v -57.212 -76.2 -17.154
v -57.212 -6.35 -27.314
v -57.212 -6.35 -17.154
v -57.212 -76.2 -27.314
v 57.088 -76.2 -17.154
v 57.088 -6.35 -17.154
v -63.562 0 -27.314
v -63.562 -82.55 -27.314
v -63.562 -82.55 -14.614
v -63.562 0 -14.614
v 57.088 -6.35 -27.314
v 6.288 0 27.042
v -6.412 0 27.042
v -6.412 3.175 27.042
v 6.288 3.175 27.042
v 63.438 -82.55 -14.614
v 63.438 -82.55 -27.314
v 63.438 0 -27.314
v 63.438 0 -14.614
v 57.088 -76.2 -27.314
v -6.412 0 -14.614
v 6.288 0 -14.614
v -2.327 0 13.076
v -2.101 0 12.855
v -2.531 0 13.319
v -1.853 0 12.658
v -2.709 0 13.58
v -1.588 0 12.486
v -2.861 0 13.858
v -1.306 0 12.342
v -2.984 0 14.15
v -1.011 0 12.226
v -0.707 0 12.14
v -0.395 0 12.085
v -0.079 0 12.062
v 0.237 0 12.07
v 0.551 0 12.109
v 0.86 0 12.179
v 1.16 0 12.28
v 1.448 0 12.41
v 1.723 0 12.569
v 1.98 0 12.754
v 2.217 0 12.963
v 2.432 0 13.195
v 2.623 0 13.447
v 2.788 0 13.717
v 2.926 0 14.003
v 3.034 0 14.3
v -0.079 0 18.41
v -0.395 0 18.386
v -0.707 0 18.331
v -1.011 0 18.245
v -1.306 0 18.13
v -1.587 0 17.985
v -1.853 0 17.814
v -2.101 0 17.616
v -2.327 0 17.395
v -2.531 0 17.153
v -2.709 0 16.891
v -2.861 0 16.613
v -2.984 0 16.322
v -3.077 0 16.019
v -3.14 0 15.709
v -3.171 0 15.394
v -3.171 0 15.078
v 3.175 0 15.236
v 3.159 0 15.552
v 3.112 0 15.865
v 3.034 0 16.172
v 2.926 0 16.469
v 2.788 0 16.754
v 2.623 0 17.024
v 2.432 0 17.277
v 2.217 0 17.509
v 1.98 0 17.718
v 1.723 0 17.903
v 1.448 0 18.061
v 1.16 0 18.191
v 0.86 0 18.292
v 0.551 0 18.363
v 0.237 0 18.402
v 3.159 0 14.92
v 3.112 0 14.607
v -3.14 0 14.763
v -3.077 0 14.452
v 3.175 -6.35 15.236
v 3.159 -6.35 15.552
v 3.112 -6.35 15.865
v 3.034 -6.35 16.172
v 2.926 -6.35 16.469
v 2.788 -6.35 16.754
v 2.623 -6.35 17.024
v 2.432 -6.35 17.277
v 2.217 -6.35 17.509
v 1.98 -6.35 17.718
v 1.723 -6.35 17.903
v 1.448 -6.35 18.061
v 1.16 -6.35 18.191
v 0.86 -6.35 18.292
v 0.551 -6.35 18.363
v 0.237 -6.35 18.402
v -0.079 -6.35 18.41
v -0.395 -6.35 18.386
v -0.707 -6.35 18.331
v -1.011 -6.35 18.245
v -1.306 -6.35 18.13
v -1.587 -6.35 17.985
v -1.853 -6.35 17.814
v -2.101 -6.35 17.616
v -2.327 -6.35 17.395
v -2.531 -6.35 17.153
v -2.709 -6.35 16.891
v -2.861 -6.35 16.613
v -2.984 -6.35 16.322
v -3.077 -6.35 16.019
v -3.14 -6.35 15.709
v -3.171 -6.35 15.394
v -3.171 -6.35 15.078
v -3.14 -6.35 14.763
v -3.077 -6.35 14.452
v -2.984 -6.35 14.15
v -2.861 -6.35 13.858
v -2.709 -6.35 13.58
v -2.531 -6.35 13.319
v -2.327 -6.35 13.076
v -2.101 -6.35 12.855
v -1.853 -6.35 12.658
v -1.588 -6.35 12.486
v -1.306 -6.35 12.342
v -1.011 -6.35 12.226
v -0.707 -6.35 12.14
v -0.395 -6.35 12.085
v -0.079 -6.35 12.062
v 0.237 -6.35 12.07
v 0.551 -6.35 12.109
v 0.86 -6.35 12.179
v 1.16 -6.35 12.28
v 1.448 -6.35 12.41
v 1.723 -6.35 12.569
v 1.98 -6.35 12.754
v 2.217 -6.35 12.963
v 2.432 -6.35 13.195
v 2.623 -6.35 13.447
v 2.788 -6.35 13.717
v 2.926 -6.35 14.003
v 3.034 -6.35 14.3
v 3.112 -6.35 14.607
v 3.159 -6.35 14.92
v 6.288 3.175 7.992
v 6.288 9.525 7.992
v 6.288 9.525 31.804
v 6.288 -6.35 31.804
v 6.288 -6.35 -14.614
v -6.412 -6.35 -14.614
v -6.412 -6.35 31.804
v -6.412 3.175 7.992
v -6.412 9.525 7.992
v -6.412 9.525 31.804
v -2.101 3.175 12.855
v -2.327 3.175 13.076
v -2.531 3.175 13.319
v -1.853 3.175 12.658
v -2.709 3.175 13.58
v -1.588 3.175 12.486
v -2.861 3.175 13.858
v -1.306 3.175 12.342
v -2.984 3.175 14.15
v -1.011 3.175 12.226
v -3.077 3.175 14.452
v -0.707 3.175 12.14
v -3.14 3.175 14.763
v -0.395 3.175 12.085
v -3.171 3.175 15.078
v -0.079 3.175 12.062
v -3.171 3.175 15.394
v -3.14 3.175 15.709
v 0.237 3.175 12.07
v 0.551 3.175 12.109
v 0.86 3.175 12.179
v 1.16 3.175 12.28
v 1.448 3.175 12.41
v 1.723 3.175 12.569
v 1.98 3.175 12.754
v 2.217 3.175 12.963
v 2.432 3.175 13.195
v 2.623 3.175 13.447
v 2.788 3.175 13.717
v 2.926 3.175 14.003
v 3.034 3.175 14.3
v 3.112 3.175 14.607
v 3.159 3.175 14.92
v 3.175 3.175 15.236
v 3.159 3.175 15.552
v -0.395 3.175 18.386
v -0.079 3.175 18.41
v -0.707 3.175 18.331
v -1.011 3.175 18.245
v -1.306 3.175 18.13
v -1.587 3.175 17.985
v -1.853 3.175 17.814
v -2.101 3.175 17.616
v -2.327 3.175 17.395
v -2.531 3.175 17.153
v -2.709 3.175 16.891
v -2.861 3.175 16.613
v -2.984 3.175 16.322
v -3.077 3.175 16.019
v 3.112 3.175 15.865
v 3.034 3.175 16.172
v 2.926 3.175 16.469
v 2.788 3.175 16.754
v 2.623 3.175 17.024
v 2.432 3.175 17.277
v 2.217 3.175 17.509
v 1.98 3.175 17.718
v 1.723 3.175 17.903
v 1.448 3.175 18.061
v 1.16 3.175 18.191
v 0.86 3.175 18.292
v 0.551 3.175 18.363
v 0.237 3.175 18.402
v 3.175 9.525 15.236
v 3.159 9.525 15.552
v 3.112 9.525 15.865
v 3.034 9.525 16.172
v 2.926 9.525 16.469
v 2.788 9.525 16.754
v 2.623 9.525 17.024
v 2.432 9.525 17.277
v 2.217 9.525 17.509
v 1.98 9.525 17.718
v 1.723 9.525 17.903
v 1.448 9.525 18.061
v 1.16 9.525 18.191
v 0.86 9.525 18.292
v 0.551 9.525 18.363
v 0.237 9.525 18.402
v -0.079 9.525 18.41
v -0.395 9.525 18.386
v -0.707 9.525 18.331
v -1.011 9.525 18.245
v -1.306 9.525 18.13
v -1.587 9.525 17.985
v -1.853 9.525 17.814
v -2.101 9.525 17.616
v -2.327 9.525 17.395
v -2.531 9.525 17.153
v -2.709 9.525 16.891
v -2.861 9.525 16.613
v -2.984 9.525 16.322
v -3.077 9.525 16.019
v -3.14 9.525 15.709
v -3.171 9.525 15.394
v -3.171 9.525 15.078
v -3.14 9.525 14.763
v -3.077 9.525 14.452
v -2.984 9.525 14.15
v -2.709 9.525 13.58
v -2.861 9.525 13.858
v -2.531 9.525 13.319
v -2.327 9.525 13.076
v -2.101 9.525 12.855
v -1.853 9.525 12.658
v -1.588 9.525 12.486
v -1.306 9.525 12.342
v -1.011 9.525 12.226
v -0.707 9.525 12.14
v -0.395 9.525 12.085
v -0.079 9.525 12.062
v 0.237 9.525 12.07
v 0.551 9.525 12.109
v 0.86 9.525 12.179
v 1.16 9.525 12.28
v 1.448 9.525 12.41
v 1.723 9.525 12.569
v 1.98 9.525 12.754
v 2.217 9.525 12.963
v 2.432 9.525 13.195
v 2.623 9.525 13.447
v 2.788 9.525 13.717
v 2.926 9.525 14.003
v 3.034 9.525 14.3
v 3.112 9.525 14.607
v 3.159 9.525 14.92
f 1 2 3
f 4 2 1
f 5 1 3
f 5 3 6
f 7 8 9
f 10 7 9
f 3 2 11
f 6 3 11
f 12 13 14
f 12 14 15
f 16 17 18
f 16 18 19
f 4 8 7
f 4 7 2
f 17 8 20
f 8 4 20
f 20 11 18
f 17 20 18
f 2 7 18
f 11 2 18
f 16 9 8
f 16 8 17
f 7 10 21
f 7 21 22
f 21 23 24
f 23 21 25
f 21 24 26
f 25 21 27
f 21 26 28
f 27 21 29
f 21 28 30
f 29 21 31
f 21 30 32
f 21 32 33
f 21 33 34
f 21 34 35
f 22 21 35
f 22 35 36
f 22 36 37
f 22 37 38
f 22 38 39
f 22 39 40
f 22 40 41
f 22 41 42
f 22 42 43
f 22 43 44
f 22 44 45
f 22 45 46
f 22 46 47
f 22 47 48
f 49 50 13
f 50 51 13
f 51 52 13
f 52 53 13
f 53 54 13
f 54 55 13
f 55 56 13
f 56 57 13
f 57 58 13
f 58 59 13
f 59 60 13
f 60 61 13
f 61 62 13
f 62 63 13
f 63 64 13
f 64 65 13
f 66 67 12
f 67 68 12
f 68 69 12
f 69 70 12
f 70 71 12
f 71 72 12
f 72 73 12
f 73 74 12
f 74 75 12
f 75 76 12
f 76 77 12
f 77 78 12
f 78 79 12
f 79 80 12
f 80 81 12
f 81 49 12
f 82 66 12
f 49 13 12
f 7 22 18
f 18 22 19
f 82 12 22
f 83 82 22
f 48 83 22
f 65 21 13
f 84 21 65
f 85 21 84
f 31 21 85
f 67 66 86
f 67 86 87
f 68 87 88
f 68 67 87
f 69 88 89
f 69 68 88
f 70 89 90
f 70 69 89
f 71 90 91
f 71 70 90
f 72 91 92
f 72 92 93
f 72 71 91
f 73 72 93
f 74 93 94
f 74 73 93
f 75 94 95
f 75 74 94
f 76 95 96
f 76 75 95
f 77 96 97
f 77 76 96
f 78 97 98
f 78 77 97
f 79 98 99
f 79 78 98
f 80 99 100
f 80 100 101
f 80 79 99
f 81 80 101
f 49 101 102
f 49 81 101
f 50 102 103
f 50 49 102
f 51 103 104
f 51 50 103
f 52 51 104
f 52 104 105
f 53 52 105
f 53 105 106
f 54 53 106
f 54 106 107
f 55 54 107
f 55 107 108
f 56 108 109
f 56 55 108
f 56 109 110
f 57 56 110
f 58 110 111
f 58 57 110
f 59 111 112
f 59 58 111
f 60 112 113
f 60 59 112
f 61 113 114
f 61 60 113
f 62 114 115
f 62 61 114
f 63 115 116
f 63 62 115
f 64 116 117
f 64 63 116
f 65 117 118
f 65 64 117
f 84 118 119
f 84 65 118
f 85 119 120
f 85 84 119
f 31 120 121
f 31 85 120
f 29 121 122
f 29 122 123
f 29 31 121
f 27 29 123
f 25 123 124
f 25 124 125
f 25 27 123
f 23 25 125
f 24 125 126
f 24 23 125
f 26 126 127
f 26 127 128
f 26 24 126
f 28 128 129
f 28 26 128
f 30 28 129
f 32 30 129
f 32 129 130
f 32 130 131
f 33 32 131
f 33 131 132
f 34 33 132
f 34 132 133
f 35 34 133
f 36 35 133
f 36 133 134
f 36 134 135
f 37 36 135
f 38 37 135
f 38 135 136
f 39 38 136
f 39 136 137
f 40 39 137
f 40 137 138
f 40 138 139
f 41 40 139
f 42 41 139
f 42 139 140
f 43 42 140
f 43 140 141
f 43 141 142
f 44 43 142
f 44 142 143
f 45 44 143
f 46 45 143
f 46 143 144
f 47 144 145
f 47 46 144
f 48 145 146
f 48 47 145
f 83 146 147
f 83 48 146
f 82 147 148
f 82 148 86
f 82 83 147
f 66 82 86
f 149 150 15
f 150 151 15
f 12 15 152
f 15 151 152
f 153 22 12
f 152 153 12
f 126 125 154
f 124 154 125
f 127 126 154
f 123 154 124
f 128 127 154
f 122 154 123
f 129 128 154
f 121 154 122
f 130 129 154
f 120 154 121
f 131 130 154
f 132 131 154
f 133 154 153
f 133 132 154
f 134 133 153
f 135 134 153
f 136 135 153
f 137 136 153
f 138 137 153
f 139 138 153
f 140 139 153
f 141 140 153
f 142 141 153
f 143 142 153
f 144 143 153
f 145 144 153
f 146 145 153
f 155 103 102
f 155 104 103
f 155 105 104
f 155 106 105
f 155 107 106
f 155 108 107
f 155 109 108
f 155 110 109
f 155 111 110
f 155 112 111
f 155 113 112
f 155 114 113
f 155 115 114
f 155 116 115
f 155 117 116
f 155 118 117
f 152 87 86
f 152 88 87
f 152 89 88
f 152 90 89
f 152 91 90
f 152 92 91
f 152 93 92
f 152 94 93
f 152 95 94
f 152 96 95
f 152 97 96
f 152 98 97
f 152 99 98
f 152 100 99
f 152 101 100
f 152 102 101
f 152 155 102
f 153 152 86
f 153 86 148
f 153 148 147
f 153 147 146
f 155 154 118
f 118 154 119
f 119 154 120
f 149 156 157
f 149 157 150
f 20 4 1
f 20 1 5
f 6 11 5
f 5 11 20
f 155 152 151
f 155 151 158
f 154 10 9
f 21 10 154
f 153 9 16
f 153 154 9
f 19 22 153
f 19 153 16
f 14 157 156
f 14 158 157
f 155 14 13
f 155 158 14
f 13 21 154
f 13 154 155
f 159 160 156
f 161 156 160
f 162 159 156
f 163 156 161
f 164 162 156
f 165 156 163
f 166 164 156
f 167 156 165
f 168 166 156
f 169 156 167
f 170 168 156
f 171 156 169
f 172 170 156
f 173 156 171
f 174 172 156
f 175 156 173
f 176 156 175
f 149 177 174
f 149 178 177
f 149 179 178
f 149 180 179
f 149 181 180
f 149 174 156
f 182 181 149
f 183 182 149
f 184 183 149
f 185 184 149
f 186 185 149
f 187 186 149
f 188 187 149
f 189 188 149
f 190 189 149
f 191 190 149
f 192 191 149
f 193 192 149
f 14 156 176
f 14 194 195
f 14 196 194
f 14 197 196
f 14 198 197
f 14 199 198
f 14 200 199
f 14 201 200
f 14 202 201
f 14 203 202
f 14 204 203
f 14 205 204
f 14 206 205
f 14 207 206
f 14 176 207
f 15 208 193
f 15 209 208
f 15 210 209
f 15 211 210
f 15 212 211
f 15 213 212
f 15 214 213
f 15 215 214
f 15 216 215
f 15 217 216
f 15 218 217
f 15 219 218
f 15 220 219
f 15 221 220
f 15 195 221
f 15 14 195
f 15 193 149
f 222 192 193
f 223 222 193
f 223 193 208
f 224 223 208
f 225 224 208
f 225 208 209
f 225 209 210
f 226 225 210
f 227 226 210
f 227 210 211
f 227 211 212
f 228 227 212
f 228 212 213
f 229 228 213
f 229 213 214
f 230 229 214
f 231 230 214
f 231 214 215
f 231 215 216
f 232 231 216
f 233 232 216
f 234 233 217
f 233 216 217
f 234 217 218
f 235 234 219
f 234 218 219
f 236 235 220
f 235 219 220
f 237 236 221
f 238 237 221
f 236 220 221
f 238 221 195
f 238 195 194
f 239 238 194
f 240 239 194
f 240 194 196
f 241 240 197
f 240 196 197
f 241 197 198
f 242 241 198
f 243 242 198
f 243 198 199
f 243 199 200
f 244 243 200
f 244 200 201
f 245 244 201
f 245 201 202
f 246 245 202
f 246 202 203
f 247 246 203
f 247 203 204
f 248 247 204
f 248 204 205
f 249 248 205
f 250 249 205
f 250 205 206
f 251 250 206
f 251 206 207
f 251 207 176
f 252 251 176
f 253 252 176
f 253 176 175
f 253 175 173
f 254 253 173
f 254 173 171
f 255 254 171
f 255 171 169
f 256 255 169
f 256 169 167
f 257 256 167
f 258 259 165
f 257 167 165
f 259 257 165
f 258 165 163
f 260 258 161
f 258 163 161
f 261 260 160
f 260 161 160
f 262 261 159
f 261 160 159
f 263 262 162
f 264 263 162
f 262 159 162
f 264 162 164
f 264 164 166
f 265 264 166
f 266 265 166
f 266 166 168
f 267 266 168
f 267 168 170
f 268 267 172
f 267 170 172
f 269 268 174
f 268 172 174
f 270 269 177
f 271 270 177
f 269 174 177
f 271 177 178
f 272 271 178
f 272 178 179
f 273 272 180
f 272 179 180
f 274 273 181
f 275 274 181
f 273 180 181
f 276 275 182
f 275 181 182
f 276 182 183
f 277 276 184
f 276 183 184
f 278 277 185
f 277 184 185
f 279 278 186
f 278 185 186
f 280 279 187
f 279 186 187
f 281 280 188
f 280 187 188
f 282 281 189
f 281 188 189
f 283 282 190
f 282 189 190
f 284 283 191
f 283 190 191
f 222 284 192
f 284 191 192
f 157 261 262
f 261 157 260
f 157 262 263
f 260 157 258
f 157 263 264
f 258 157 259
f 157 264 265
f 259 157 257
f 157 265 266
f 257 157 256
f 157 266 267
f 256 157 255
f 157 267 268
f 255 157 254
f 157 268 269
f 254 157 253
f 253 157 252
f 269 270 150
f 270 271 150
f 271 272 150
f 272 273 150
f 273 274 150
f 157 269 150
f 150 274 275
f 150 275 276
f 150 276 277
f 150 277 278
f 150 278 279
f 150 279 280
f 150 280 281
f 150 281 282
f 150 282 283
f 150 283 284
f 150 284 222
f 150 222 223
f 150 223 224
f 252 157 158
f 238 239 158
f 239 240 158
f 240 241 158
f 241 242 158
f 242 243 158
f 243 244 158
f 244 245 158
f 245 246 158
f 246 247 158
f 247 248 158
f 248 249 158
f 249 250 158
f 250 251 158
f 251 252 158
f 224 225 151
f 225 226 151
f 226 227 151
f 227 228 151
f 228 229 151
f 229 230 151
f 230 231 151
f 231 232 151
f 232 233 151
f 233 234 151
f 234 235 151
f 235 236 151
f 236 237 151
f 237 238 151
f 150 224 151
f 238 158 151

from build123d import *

# Parameters (mm, degrees)
F0_R      = 3.175
F1_DEPTH  = 6.35
F2_DEPTH  = 6.35
F3_DEPTH  = 9.525
F4_W      = 12.7
F4_H      = 6.35
F5_DEPTH  = 19.05
F6_DEPTH  = 25.4
F7_W      = 127
F7_H      = 12.7
F8_DEPTH  = 76.2
F9_W      = 114.3
F9_H      = 69.85
F10_DEPTH = 10.16


with BuildPart() as f1:
    # F0 (on Front) → F1 (new body)
    with BuildSketch(Plane.XZ):
        Polygon((6.288046, 27.041709), (0, 27.041709), (-6.411954, 27.041709), (-6.411954, -14.614291), (-63.561954, -14.614291), (-63.561954, -27.314291), (-6.411954, -27.314291), (6.288046, -27.314291), (63.438046, -27.314291), (63.438046, -14.614291), (6.288046, -14.614291), align=None)
        with Locations((0, 15.235816)):
            Circle(F0_R, mode=Mode.SUBTRACT)
    extrude(amount=F1_DEPTH)

    # F0 (on Front) → F2 (join)
    with BuildSketch(Plane.XZ):
        Polygon((-6.411954, 27.041709), (0, 27.041709), (6.288046, 27.041709), (6.288046, 31.804209), (-6.411954, 31.804209), align=None)
    extrude(amount=F2_DEPTH)

    # F0 (on Front) → F3 (join)
    with BuildSketch(Plane.XZ):
        Polygon((-6.411954, 27.041709), (0, 27.041709), (6.288046, 27.041709), (6.288046, 31.804209), (-6.411954, 31.804209), align=None)
    extrude(amount=-F3_DEPTH)

    # F4 (on face) → F5 (join)
    with BuildSketch(Plane(origin=(0, 0, 27.041709), x_dir=(1, 0, 0), z_dir=(0, 0, -1))):
        with Locations((-0.061954, -6.35)):
            Rectangle(F4_W, F4_H)
    extrude(amount=F5_DEPTH)

    # F0 (on Front) → F6 (cut)
    with BuildSketch(Plane.XZ):
        with Locations((0, 15.235816)):
            Circle(F0_R)
    extrude(amount=-F6_DEPTH, mode=Mode.SUBTRACT)

    # F7 (on face) → F8 (join)
    with BuildSketch(Plane.XZ.offset(6.35)):
        with Locations((-0.061954, -20.964291)):
            Rectangle(F7_W, F7_H)
    extrude(amount=F8_DEPTH)

    # F9 (on face) → F10 (cut)
    with BuildSketch(Plane(origin=(0, 0, -27.314291), x_dir=(1, 0, 0), z_dir=(0, 0, -1))):
        with Locations((-0.061954, 41.275)):
            Rectangle(F9_W, F9_H)
    extrude(amount=-F10_DEPTH, mode=Mode.SUBTRACT)


solid = f1.part
